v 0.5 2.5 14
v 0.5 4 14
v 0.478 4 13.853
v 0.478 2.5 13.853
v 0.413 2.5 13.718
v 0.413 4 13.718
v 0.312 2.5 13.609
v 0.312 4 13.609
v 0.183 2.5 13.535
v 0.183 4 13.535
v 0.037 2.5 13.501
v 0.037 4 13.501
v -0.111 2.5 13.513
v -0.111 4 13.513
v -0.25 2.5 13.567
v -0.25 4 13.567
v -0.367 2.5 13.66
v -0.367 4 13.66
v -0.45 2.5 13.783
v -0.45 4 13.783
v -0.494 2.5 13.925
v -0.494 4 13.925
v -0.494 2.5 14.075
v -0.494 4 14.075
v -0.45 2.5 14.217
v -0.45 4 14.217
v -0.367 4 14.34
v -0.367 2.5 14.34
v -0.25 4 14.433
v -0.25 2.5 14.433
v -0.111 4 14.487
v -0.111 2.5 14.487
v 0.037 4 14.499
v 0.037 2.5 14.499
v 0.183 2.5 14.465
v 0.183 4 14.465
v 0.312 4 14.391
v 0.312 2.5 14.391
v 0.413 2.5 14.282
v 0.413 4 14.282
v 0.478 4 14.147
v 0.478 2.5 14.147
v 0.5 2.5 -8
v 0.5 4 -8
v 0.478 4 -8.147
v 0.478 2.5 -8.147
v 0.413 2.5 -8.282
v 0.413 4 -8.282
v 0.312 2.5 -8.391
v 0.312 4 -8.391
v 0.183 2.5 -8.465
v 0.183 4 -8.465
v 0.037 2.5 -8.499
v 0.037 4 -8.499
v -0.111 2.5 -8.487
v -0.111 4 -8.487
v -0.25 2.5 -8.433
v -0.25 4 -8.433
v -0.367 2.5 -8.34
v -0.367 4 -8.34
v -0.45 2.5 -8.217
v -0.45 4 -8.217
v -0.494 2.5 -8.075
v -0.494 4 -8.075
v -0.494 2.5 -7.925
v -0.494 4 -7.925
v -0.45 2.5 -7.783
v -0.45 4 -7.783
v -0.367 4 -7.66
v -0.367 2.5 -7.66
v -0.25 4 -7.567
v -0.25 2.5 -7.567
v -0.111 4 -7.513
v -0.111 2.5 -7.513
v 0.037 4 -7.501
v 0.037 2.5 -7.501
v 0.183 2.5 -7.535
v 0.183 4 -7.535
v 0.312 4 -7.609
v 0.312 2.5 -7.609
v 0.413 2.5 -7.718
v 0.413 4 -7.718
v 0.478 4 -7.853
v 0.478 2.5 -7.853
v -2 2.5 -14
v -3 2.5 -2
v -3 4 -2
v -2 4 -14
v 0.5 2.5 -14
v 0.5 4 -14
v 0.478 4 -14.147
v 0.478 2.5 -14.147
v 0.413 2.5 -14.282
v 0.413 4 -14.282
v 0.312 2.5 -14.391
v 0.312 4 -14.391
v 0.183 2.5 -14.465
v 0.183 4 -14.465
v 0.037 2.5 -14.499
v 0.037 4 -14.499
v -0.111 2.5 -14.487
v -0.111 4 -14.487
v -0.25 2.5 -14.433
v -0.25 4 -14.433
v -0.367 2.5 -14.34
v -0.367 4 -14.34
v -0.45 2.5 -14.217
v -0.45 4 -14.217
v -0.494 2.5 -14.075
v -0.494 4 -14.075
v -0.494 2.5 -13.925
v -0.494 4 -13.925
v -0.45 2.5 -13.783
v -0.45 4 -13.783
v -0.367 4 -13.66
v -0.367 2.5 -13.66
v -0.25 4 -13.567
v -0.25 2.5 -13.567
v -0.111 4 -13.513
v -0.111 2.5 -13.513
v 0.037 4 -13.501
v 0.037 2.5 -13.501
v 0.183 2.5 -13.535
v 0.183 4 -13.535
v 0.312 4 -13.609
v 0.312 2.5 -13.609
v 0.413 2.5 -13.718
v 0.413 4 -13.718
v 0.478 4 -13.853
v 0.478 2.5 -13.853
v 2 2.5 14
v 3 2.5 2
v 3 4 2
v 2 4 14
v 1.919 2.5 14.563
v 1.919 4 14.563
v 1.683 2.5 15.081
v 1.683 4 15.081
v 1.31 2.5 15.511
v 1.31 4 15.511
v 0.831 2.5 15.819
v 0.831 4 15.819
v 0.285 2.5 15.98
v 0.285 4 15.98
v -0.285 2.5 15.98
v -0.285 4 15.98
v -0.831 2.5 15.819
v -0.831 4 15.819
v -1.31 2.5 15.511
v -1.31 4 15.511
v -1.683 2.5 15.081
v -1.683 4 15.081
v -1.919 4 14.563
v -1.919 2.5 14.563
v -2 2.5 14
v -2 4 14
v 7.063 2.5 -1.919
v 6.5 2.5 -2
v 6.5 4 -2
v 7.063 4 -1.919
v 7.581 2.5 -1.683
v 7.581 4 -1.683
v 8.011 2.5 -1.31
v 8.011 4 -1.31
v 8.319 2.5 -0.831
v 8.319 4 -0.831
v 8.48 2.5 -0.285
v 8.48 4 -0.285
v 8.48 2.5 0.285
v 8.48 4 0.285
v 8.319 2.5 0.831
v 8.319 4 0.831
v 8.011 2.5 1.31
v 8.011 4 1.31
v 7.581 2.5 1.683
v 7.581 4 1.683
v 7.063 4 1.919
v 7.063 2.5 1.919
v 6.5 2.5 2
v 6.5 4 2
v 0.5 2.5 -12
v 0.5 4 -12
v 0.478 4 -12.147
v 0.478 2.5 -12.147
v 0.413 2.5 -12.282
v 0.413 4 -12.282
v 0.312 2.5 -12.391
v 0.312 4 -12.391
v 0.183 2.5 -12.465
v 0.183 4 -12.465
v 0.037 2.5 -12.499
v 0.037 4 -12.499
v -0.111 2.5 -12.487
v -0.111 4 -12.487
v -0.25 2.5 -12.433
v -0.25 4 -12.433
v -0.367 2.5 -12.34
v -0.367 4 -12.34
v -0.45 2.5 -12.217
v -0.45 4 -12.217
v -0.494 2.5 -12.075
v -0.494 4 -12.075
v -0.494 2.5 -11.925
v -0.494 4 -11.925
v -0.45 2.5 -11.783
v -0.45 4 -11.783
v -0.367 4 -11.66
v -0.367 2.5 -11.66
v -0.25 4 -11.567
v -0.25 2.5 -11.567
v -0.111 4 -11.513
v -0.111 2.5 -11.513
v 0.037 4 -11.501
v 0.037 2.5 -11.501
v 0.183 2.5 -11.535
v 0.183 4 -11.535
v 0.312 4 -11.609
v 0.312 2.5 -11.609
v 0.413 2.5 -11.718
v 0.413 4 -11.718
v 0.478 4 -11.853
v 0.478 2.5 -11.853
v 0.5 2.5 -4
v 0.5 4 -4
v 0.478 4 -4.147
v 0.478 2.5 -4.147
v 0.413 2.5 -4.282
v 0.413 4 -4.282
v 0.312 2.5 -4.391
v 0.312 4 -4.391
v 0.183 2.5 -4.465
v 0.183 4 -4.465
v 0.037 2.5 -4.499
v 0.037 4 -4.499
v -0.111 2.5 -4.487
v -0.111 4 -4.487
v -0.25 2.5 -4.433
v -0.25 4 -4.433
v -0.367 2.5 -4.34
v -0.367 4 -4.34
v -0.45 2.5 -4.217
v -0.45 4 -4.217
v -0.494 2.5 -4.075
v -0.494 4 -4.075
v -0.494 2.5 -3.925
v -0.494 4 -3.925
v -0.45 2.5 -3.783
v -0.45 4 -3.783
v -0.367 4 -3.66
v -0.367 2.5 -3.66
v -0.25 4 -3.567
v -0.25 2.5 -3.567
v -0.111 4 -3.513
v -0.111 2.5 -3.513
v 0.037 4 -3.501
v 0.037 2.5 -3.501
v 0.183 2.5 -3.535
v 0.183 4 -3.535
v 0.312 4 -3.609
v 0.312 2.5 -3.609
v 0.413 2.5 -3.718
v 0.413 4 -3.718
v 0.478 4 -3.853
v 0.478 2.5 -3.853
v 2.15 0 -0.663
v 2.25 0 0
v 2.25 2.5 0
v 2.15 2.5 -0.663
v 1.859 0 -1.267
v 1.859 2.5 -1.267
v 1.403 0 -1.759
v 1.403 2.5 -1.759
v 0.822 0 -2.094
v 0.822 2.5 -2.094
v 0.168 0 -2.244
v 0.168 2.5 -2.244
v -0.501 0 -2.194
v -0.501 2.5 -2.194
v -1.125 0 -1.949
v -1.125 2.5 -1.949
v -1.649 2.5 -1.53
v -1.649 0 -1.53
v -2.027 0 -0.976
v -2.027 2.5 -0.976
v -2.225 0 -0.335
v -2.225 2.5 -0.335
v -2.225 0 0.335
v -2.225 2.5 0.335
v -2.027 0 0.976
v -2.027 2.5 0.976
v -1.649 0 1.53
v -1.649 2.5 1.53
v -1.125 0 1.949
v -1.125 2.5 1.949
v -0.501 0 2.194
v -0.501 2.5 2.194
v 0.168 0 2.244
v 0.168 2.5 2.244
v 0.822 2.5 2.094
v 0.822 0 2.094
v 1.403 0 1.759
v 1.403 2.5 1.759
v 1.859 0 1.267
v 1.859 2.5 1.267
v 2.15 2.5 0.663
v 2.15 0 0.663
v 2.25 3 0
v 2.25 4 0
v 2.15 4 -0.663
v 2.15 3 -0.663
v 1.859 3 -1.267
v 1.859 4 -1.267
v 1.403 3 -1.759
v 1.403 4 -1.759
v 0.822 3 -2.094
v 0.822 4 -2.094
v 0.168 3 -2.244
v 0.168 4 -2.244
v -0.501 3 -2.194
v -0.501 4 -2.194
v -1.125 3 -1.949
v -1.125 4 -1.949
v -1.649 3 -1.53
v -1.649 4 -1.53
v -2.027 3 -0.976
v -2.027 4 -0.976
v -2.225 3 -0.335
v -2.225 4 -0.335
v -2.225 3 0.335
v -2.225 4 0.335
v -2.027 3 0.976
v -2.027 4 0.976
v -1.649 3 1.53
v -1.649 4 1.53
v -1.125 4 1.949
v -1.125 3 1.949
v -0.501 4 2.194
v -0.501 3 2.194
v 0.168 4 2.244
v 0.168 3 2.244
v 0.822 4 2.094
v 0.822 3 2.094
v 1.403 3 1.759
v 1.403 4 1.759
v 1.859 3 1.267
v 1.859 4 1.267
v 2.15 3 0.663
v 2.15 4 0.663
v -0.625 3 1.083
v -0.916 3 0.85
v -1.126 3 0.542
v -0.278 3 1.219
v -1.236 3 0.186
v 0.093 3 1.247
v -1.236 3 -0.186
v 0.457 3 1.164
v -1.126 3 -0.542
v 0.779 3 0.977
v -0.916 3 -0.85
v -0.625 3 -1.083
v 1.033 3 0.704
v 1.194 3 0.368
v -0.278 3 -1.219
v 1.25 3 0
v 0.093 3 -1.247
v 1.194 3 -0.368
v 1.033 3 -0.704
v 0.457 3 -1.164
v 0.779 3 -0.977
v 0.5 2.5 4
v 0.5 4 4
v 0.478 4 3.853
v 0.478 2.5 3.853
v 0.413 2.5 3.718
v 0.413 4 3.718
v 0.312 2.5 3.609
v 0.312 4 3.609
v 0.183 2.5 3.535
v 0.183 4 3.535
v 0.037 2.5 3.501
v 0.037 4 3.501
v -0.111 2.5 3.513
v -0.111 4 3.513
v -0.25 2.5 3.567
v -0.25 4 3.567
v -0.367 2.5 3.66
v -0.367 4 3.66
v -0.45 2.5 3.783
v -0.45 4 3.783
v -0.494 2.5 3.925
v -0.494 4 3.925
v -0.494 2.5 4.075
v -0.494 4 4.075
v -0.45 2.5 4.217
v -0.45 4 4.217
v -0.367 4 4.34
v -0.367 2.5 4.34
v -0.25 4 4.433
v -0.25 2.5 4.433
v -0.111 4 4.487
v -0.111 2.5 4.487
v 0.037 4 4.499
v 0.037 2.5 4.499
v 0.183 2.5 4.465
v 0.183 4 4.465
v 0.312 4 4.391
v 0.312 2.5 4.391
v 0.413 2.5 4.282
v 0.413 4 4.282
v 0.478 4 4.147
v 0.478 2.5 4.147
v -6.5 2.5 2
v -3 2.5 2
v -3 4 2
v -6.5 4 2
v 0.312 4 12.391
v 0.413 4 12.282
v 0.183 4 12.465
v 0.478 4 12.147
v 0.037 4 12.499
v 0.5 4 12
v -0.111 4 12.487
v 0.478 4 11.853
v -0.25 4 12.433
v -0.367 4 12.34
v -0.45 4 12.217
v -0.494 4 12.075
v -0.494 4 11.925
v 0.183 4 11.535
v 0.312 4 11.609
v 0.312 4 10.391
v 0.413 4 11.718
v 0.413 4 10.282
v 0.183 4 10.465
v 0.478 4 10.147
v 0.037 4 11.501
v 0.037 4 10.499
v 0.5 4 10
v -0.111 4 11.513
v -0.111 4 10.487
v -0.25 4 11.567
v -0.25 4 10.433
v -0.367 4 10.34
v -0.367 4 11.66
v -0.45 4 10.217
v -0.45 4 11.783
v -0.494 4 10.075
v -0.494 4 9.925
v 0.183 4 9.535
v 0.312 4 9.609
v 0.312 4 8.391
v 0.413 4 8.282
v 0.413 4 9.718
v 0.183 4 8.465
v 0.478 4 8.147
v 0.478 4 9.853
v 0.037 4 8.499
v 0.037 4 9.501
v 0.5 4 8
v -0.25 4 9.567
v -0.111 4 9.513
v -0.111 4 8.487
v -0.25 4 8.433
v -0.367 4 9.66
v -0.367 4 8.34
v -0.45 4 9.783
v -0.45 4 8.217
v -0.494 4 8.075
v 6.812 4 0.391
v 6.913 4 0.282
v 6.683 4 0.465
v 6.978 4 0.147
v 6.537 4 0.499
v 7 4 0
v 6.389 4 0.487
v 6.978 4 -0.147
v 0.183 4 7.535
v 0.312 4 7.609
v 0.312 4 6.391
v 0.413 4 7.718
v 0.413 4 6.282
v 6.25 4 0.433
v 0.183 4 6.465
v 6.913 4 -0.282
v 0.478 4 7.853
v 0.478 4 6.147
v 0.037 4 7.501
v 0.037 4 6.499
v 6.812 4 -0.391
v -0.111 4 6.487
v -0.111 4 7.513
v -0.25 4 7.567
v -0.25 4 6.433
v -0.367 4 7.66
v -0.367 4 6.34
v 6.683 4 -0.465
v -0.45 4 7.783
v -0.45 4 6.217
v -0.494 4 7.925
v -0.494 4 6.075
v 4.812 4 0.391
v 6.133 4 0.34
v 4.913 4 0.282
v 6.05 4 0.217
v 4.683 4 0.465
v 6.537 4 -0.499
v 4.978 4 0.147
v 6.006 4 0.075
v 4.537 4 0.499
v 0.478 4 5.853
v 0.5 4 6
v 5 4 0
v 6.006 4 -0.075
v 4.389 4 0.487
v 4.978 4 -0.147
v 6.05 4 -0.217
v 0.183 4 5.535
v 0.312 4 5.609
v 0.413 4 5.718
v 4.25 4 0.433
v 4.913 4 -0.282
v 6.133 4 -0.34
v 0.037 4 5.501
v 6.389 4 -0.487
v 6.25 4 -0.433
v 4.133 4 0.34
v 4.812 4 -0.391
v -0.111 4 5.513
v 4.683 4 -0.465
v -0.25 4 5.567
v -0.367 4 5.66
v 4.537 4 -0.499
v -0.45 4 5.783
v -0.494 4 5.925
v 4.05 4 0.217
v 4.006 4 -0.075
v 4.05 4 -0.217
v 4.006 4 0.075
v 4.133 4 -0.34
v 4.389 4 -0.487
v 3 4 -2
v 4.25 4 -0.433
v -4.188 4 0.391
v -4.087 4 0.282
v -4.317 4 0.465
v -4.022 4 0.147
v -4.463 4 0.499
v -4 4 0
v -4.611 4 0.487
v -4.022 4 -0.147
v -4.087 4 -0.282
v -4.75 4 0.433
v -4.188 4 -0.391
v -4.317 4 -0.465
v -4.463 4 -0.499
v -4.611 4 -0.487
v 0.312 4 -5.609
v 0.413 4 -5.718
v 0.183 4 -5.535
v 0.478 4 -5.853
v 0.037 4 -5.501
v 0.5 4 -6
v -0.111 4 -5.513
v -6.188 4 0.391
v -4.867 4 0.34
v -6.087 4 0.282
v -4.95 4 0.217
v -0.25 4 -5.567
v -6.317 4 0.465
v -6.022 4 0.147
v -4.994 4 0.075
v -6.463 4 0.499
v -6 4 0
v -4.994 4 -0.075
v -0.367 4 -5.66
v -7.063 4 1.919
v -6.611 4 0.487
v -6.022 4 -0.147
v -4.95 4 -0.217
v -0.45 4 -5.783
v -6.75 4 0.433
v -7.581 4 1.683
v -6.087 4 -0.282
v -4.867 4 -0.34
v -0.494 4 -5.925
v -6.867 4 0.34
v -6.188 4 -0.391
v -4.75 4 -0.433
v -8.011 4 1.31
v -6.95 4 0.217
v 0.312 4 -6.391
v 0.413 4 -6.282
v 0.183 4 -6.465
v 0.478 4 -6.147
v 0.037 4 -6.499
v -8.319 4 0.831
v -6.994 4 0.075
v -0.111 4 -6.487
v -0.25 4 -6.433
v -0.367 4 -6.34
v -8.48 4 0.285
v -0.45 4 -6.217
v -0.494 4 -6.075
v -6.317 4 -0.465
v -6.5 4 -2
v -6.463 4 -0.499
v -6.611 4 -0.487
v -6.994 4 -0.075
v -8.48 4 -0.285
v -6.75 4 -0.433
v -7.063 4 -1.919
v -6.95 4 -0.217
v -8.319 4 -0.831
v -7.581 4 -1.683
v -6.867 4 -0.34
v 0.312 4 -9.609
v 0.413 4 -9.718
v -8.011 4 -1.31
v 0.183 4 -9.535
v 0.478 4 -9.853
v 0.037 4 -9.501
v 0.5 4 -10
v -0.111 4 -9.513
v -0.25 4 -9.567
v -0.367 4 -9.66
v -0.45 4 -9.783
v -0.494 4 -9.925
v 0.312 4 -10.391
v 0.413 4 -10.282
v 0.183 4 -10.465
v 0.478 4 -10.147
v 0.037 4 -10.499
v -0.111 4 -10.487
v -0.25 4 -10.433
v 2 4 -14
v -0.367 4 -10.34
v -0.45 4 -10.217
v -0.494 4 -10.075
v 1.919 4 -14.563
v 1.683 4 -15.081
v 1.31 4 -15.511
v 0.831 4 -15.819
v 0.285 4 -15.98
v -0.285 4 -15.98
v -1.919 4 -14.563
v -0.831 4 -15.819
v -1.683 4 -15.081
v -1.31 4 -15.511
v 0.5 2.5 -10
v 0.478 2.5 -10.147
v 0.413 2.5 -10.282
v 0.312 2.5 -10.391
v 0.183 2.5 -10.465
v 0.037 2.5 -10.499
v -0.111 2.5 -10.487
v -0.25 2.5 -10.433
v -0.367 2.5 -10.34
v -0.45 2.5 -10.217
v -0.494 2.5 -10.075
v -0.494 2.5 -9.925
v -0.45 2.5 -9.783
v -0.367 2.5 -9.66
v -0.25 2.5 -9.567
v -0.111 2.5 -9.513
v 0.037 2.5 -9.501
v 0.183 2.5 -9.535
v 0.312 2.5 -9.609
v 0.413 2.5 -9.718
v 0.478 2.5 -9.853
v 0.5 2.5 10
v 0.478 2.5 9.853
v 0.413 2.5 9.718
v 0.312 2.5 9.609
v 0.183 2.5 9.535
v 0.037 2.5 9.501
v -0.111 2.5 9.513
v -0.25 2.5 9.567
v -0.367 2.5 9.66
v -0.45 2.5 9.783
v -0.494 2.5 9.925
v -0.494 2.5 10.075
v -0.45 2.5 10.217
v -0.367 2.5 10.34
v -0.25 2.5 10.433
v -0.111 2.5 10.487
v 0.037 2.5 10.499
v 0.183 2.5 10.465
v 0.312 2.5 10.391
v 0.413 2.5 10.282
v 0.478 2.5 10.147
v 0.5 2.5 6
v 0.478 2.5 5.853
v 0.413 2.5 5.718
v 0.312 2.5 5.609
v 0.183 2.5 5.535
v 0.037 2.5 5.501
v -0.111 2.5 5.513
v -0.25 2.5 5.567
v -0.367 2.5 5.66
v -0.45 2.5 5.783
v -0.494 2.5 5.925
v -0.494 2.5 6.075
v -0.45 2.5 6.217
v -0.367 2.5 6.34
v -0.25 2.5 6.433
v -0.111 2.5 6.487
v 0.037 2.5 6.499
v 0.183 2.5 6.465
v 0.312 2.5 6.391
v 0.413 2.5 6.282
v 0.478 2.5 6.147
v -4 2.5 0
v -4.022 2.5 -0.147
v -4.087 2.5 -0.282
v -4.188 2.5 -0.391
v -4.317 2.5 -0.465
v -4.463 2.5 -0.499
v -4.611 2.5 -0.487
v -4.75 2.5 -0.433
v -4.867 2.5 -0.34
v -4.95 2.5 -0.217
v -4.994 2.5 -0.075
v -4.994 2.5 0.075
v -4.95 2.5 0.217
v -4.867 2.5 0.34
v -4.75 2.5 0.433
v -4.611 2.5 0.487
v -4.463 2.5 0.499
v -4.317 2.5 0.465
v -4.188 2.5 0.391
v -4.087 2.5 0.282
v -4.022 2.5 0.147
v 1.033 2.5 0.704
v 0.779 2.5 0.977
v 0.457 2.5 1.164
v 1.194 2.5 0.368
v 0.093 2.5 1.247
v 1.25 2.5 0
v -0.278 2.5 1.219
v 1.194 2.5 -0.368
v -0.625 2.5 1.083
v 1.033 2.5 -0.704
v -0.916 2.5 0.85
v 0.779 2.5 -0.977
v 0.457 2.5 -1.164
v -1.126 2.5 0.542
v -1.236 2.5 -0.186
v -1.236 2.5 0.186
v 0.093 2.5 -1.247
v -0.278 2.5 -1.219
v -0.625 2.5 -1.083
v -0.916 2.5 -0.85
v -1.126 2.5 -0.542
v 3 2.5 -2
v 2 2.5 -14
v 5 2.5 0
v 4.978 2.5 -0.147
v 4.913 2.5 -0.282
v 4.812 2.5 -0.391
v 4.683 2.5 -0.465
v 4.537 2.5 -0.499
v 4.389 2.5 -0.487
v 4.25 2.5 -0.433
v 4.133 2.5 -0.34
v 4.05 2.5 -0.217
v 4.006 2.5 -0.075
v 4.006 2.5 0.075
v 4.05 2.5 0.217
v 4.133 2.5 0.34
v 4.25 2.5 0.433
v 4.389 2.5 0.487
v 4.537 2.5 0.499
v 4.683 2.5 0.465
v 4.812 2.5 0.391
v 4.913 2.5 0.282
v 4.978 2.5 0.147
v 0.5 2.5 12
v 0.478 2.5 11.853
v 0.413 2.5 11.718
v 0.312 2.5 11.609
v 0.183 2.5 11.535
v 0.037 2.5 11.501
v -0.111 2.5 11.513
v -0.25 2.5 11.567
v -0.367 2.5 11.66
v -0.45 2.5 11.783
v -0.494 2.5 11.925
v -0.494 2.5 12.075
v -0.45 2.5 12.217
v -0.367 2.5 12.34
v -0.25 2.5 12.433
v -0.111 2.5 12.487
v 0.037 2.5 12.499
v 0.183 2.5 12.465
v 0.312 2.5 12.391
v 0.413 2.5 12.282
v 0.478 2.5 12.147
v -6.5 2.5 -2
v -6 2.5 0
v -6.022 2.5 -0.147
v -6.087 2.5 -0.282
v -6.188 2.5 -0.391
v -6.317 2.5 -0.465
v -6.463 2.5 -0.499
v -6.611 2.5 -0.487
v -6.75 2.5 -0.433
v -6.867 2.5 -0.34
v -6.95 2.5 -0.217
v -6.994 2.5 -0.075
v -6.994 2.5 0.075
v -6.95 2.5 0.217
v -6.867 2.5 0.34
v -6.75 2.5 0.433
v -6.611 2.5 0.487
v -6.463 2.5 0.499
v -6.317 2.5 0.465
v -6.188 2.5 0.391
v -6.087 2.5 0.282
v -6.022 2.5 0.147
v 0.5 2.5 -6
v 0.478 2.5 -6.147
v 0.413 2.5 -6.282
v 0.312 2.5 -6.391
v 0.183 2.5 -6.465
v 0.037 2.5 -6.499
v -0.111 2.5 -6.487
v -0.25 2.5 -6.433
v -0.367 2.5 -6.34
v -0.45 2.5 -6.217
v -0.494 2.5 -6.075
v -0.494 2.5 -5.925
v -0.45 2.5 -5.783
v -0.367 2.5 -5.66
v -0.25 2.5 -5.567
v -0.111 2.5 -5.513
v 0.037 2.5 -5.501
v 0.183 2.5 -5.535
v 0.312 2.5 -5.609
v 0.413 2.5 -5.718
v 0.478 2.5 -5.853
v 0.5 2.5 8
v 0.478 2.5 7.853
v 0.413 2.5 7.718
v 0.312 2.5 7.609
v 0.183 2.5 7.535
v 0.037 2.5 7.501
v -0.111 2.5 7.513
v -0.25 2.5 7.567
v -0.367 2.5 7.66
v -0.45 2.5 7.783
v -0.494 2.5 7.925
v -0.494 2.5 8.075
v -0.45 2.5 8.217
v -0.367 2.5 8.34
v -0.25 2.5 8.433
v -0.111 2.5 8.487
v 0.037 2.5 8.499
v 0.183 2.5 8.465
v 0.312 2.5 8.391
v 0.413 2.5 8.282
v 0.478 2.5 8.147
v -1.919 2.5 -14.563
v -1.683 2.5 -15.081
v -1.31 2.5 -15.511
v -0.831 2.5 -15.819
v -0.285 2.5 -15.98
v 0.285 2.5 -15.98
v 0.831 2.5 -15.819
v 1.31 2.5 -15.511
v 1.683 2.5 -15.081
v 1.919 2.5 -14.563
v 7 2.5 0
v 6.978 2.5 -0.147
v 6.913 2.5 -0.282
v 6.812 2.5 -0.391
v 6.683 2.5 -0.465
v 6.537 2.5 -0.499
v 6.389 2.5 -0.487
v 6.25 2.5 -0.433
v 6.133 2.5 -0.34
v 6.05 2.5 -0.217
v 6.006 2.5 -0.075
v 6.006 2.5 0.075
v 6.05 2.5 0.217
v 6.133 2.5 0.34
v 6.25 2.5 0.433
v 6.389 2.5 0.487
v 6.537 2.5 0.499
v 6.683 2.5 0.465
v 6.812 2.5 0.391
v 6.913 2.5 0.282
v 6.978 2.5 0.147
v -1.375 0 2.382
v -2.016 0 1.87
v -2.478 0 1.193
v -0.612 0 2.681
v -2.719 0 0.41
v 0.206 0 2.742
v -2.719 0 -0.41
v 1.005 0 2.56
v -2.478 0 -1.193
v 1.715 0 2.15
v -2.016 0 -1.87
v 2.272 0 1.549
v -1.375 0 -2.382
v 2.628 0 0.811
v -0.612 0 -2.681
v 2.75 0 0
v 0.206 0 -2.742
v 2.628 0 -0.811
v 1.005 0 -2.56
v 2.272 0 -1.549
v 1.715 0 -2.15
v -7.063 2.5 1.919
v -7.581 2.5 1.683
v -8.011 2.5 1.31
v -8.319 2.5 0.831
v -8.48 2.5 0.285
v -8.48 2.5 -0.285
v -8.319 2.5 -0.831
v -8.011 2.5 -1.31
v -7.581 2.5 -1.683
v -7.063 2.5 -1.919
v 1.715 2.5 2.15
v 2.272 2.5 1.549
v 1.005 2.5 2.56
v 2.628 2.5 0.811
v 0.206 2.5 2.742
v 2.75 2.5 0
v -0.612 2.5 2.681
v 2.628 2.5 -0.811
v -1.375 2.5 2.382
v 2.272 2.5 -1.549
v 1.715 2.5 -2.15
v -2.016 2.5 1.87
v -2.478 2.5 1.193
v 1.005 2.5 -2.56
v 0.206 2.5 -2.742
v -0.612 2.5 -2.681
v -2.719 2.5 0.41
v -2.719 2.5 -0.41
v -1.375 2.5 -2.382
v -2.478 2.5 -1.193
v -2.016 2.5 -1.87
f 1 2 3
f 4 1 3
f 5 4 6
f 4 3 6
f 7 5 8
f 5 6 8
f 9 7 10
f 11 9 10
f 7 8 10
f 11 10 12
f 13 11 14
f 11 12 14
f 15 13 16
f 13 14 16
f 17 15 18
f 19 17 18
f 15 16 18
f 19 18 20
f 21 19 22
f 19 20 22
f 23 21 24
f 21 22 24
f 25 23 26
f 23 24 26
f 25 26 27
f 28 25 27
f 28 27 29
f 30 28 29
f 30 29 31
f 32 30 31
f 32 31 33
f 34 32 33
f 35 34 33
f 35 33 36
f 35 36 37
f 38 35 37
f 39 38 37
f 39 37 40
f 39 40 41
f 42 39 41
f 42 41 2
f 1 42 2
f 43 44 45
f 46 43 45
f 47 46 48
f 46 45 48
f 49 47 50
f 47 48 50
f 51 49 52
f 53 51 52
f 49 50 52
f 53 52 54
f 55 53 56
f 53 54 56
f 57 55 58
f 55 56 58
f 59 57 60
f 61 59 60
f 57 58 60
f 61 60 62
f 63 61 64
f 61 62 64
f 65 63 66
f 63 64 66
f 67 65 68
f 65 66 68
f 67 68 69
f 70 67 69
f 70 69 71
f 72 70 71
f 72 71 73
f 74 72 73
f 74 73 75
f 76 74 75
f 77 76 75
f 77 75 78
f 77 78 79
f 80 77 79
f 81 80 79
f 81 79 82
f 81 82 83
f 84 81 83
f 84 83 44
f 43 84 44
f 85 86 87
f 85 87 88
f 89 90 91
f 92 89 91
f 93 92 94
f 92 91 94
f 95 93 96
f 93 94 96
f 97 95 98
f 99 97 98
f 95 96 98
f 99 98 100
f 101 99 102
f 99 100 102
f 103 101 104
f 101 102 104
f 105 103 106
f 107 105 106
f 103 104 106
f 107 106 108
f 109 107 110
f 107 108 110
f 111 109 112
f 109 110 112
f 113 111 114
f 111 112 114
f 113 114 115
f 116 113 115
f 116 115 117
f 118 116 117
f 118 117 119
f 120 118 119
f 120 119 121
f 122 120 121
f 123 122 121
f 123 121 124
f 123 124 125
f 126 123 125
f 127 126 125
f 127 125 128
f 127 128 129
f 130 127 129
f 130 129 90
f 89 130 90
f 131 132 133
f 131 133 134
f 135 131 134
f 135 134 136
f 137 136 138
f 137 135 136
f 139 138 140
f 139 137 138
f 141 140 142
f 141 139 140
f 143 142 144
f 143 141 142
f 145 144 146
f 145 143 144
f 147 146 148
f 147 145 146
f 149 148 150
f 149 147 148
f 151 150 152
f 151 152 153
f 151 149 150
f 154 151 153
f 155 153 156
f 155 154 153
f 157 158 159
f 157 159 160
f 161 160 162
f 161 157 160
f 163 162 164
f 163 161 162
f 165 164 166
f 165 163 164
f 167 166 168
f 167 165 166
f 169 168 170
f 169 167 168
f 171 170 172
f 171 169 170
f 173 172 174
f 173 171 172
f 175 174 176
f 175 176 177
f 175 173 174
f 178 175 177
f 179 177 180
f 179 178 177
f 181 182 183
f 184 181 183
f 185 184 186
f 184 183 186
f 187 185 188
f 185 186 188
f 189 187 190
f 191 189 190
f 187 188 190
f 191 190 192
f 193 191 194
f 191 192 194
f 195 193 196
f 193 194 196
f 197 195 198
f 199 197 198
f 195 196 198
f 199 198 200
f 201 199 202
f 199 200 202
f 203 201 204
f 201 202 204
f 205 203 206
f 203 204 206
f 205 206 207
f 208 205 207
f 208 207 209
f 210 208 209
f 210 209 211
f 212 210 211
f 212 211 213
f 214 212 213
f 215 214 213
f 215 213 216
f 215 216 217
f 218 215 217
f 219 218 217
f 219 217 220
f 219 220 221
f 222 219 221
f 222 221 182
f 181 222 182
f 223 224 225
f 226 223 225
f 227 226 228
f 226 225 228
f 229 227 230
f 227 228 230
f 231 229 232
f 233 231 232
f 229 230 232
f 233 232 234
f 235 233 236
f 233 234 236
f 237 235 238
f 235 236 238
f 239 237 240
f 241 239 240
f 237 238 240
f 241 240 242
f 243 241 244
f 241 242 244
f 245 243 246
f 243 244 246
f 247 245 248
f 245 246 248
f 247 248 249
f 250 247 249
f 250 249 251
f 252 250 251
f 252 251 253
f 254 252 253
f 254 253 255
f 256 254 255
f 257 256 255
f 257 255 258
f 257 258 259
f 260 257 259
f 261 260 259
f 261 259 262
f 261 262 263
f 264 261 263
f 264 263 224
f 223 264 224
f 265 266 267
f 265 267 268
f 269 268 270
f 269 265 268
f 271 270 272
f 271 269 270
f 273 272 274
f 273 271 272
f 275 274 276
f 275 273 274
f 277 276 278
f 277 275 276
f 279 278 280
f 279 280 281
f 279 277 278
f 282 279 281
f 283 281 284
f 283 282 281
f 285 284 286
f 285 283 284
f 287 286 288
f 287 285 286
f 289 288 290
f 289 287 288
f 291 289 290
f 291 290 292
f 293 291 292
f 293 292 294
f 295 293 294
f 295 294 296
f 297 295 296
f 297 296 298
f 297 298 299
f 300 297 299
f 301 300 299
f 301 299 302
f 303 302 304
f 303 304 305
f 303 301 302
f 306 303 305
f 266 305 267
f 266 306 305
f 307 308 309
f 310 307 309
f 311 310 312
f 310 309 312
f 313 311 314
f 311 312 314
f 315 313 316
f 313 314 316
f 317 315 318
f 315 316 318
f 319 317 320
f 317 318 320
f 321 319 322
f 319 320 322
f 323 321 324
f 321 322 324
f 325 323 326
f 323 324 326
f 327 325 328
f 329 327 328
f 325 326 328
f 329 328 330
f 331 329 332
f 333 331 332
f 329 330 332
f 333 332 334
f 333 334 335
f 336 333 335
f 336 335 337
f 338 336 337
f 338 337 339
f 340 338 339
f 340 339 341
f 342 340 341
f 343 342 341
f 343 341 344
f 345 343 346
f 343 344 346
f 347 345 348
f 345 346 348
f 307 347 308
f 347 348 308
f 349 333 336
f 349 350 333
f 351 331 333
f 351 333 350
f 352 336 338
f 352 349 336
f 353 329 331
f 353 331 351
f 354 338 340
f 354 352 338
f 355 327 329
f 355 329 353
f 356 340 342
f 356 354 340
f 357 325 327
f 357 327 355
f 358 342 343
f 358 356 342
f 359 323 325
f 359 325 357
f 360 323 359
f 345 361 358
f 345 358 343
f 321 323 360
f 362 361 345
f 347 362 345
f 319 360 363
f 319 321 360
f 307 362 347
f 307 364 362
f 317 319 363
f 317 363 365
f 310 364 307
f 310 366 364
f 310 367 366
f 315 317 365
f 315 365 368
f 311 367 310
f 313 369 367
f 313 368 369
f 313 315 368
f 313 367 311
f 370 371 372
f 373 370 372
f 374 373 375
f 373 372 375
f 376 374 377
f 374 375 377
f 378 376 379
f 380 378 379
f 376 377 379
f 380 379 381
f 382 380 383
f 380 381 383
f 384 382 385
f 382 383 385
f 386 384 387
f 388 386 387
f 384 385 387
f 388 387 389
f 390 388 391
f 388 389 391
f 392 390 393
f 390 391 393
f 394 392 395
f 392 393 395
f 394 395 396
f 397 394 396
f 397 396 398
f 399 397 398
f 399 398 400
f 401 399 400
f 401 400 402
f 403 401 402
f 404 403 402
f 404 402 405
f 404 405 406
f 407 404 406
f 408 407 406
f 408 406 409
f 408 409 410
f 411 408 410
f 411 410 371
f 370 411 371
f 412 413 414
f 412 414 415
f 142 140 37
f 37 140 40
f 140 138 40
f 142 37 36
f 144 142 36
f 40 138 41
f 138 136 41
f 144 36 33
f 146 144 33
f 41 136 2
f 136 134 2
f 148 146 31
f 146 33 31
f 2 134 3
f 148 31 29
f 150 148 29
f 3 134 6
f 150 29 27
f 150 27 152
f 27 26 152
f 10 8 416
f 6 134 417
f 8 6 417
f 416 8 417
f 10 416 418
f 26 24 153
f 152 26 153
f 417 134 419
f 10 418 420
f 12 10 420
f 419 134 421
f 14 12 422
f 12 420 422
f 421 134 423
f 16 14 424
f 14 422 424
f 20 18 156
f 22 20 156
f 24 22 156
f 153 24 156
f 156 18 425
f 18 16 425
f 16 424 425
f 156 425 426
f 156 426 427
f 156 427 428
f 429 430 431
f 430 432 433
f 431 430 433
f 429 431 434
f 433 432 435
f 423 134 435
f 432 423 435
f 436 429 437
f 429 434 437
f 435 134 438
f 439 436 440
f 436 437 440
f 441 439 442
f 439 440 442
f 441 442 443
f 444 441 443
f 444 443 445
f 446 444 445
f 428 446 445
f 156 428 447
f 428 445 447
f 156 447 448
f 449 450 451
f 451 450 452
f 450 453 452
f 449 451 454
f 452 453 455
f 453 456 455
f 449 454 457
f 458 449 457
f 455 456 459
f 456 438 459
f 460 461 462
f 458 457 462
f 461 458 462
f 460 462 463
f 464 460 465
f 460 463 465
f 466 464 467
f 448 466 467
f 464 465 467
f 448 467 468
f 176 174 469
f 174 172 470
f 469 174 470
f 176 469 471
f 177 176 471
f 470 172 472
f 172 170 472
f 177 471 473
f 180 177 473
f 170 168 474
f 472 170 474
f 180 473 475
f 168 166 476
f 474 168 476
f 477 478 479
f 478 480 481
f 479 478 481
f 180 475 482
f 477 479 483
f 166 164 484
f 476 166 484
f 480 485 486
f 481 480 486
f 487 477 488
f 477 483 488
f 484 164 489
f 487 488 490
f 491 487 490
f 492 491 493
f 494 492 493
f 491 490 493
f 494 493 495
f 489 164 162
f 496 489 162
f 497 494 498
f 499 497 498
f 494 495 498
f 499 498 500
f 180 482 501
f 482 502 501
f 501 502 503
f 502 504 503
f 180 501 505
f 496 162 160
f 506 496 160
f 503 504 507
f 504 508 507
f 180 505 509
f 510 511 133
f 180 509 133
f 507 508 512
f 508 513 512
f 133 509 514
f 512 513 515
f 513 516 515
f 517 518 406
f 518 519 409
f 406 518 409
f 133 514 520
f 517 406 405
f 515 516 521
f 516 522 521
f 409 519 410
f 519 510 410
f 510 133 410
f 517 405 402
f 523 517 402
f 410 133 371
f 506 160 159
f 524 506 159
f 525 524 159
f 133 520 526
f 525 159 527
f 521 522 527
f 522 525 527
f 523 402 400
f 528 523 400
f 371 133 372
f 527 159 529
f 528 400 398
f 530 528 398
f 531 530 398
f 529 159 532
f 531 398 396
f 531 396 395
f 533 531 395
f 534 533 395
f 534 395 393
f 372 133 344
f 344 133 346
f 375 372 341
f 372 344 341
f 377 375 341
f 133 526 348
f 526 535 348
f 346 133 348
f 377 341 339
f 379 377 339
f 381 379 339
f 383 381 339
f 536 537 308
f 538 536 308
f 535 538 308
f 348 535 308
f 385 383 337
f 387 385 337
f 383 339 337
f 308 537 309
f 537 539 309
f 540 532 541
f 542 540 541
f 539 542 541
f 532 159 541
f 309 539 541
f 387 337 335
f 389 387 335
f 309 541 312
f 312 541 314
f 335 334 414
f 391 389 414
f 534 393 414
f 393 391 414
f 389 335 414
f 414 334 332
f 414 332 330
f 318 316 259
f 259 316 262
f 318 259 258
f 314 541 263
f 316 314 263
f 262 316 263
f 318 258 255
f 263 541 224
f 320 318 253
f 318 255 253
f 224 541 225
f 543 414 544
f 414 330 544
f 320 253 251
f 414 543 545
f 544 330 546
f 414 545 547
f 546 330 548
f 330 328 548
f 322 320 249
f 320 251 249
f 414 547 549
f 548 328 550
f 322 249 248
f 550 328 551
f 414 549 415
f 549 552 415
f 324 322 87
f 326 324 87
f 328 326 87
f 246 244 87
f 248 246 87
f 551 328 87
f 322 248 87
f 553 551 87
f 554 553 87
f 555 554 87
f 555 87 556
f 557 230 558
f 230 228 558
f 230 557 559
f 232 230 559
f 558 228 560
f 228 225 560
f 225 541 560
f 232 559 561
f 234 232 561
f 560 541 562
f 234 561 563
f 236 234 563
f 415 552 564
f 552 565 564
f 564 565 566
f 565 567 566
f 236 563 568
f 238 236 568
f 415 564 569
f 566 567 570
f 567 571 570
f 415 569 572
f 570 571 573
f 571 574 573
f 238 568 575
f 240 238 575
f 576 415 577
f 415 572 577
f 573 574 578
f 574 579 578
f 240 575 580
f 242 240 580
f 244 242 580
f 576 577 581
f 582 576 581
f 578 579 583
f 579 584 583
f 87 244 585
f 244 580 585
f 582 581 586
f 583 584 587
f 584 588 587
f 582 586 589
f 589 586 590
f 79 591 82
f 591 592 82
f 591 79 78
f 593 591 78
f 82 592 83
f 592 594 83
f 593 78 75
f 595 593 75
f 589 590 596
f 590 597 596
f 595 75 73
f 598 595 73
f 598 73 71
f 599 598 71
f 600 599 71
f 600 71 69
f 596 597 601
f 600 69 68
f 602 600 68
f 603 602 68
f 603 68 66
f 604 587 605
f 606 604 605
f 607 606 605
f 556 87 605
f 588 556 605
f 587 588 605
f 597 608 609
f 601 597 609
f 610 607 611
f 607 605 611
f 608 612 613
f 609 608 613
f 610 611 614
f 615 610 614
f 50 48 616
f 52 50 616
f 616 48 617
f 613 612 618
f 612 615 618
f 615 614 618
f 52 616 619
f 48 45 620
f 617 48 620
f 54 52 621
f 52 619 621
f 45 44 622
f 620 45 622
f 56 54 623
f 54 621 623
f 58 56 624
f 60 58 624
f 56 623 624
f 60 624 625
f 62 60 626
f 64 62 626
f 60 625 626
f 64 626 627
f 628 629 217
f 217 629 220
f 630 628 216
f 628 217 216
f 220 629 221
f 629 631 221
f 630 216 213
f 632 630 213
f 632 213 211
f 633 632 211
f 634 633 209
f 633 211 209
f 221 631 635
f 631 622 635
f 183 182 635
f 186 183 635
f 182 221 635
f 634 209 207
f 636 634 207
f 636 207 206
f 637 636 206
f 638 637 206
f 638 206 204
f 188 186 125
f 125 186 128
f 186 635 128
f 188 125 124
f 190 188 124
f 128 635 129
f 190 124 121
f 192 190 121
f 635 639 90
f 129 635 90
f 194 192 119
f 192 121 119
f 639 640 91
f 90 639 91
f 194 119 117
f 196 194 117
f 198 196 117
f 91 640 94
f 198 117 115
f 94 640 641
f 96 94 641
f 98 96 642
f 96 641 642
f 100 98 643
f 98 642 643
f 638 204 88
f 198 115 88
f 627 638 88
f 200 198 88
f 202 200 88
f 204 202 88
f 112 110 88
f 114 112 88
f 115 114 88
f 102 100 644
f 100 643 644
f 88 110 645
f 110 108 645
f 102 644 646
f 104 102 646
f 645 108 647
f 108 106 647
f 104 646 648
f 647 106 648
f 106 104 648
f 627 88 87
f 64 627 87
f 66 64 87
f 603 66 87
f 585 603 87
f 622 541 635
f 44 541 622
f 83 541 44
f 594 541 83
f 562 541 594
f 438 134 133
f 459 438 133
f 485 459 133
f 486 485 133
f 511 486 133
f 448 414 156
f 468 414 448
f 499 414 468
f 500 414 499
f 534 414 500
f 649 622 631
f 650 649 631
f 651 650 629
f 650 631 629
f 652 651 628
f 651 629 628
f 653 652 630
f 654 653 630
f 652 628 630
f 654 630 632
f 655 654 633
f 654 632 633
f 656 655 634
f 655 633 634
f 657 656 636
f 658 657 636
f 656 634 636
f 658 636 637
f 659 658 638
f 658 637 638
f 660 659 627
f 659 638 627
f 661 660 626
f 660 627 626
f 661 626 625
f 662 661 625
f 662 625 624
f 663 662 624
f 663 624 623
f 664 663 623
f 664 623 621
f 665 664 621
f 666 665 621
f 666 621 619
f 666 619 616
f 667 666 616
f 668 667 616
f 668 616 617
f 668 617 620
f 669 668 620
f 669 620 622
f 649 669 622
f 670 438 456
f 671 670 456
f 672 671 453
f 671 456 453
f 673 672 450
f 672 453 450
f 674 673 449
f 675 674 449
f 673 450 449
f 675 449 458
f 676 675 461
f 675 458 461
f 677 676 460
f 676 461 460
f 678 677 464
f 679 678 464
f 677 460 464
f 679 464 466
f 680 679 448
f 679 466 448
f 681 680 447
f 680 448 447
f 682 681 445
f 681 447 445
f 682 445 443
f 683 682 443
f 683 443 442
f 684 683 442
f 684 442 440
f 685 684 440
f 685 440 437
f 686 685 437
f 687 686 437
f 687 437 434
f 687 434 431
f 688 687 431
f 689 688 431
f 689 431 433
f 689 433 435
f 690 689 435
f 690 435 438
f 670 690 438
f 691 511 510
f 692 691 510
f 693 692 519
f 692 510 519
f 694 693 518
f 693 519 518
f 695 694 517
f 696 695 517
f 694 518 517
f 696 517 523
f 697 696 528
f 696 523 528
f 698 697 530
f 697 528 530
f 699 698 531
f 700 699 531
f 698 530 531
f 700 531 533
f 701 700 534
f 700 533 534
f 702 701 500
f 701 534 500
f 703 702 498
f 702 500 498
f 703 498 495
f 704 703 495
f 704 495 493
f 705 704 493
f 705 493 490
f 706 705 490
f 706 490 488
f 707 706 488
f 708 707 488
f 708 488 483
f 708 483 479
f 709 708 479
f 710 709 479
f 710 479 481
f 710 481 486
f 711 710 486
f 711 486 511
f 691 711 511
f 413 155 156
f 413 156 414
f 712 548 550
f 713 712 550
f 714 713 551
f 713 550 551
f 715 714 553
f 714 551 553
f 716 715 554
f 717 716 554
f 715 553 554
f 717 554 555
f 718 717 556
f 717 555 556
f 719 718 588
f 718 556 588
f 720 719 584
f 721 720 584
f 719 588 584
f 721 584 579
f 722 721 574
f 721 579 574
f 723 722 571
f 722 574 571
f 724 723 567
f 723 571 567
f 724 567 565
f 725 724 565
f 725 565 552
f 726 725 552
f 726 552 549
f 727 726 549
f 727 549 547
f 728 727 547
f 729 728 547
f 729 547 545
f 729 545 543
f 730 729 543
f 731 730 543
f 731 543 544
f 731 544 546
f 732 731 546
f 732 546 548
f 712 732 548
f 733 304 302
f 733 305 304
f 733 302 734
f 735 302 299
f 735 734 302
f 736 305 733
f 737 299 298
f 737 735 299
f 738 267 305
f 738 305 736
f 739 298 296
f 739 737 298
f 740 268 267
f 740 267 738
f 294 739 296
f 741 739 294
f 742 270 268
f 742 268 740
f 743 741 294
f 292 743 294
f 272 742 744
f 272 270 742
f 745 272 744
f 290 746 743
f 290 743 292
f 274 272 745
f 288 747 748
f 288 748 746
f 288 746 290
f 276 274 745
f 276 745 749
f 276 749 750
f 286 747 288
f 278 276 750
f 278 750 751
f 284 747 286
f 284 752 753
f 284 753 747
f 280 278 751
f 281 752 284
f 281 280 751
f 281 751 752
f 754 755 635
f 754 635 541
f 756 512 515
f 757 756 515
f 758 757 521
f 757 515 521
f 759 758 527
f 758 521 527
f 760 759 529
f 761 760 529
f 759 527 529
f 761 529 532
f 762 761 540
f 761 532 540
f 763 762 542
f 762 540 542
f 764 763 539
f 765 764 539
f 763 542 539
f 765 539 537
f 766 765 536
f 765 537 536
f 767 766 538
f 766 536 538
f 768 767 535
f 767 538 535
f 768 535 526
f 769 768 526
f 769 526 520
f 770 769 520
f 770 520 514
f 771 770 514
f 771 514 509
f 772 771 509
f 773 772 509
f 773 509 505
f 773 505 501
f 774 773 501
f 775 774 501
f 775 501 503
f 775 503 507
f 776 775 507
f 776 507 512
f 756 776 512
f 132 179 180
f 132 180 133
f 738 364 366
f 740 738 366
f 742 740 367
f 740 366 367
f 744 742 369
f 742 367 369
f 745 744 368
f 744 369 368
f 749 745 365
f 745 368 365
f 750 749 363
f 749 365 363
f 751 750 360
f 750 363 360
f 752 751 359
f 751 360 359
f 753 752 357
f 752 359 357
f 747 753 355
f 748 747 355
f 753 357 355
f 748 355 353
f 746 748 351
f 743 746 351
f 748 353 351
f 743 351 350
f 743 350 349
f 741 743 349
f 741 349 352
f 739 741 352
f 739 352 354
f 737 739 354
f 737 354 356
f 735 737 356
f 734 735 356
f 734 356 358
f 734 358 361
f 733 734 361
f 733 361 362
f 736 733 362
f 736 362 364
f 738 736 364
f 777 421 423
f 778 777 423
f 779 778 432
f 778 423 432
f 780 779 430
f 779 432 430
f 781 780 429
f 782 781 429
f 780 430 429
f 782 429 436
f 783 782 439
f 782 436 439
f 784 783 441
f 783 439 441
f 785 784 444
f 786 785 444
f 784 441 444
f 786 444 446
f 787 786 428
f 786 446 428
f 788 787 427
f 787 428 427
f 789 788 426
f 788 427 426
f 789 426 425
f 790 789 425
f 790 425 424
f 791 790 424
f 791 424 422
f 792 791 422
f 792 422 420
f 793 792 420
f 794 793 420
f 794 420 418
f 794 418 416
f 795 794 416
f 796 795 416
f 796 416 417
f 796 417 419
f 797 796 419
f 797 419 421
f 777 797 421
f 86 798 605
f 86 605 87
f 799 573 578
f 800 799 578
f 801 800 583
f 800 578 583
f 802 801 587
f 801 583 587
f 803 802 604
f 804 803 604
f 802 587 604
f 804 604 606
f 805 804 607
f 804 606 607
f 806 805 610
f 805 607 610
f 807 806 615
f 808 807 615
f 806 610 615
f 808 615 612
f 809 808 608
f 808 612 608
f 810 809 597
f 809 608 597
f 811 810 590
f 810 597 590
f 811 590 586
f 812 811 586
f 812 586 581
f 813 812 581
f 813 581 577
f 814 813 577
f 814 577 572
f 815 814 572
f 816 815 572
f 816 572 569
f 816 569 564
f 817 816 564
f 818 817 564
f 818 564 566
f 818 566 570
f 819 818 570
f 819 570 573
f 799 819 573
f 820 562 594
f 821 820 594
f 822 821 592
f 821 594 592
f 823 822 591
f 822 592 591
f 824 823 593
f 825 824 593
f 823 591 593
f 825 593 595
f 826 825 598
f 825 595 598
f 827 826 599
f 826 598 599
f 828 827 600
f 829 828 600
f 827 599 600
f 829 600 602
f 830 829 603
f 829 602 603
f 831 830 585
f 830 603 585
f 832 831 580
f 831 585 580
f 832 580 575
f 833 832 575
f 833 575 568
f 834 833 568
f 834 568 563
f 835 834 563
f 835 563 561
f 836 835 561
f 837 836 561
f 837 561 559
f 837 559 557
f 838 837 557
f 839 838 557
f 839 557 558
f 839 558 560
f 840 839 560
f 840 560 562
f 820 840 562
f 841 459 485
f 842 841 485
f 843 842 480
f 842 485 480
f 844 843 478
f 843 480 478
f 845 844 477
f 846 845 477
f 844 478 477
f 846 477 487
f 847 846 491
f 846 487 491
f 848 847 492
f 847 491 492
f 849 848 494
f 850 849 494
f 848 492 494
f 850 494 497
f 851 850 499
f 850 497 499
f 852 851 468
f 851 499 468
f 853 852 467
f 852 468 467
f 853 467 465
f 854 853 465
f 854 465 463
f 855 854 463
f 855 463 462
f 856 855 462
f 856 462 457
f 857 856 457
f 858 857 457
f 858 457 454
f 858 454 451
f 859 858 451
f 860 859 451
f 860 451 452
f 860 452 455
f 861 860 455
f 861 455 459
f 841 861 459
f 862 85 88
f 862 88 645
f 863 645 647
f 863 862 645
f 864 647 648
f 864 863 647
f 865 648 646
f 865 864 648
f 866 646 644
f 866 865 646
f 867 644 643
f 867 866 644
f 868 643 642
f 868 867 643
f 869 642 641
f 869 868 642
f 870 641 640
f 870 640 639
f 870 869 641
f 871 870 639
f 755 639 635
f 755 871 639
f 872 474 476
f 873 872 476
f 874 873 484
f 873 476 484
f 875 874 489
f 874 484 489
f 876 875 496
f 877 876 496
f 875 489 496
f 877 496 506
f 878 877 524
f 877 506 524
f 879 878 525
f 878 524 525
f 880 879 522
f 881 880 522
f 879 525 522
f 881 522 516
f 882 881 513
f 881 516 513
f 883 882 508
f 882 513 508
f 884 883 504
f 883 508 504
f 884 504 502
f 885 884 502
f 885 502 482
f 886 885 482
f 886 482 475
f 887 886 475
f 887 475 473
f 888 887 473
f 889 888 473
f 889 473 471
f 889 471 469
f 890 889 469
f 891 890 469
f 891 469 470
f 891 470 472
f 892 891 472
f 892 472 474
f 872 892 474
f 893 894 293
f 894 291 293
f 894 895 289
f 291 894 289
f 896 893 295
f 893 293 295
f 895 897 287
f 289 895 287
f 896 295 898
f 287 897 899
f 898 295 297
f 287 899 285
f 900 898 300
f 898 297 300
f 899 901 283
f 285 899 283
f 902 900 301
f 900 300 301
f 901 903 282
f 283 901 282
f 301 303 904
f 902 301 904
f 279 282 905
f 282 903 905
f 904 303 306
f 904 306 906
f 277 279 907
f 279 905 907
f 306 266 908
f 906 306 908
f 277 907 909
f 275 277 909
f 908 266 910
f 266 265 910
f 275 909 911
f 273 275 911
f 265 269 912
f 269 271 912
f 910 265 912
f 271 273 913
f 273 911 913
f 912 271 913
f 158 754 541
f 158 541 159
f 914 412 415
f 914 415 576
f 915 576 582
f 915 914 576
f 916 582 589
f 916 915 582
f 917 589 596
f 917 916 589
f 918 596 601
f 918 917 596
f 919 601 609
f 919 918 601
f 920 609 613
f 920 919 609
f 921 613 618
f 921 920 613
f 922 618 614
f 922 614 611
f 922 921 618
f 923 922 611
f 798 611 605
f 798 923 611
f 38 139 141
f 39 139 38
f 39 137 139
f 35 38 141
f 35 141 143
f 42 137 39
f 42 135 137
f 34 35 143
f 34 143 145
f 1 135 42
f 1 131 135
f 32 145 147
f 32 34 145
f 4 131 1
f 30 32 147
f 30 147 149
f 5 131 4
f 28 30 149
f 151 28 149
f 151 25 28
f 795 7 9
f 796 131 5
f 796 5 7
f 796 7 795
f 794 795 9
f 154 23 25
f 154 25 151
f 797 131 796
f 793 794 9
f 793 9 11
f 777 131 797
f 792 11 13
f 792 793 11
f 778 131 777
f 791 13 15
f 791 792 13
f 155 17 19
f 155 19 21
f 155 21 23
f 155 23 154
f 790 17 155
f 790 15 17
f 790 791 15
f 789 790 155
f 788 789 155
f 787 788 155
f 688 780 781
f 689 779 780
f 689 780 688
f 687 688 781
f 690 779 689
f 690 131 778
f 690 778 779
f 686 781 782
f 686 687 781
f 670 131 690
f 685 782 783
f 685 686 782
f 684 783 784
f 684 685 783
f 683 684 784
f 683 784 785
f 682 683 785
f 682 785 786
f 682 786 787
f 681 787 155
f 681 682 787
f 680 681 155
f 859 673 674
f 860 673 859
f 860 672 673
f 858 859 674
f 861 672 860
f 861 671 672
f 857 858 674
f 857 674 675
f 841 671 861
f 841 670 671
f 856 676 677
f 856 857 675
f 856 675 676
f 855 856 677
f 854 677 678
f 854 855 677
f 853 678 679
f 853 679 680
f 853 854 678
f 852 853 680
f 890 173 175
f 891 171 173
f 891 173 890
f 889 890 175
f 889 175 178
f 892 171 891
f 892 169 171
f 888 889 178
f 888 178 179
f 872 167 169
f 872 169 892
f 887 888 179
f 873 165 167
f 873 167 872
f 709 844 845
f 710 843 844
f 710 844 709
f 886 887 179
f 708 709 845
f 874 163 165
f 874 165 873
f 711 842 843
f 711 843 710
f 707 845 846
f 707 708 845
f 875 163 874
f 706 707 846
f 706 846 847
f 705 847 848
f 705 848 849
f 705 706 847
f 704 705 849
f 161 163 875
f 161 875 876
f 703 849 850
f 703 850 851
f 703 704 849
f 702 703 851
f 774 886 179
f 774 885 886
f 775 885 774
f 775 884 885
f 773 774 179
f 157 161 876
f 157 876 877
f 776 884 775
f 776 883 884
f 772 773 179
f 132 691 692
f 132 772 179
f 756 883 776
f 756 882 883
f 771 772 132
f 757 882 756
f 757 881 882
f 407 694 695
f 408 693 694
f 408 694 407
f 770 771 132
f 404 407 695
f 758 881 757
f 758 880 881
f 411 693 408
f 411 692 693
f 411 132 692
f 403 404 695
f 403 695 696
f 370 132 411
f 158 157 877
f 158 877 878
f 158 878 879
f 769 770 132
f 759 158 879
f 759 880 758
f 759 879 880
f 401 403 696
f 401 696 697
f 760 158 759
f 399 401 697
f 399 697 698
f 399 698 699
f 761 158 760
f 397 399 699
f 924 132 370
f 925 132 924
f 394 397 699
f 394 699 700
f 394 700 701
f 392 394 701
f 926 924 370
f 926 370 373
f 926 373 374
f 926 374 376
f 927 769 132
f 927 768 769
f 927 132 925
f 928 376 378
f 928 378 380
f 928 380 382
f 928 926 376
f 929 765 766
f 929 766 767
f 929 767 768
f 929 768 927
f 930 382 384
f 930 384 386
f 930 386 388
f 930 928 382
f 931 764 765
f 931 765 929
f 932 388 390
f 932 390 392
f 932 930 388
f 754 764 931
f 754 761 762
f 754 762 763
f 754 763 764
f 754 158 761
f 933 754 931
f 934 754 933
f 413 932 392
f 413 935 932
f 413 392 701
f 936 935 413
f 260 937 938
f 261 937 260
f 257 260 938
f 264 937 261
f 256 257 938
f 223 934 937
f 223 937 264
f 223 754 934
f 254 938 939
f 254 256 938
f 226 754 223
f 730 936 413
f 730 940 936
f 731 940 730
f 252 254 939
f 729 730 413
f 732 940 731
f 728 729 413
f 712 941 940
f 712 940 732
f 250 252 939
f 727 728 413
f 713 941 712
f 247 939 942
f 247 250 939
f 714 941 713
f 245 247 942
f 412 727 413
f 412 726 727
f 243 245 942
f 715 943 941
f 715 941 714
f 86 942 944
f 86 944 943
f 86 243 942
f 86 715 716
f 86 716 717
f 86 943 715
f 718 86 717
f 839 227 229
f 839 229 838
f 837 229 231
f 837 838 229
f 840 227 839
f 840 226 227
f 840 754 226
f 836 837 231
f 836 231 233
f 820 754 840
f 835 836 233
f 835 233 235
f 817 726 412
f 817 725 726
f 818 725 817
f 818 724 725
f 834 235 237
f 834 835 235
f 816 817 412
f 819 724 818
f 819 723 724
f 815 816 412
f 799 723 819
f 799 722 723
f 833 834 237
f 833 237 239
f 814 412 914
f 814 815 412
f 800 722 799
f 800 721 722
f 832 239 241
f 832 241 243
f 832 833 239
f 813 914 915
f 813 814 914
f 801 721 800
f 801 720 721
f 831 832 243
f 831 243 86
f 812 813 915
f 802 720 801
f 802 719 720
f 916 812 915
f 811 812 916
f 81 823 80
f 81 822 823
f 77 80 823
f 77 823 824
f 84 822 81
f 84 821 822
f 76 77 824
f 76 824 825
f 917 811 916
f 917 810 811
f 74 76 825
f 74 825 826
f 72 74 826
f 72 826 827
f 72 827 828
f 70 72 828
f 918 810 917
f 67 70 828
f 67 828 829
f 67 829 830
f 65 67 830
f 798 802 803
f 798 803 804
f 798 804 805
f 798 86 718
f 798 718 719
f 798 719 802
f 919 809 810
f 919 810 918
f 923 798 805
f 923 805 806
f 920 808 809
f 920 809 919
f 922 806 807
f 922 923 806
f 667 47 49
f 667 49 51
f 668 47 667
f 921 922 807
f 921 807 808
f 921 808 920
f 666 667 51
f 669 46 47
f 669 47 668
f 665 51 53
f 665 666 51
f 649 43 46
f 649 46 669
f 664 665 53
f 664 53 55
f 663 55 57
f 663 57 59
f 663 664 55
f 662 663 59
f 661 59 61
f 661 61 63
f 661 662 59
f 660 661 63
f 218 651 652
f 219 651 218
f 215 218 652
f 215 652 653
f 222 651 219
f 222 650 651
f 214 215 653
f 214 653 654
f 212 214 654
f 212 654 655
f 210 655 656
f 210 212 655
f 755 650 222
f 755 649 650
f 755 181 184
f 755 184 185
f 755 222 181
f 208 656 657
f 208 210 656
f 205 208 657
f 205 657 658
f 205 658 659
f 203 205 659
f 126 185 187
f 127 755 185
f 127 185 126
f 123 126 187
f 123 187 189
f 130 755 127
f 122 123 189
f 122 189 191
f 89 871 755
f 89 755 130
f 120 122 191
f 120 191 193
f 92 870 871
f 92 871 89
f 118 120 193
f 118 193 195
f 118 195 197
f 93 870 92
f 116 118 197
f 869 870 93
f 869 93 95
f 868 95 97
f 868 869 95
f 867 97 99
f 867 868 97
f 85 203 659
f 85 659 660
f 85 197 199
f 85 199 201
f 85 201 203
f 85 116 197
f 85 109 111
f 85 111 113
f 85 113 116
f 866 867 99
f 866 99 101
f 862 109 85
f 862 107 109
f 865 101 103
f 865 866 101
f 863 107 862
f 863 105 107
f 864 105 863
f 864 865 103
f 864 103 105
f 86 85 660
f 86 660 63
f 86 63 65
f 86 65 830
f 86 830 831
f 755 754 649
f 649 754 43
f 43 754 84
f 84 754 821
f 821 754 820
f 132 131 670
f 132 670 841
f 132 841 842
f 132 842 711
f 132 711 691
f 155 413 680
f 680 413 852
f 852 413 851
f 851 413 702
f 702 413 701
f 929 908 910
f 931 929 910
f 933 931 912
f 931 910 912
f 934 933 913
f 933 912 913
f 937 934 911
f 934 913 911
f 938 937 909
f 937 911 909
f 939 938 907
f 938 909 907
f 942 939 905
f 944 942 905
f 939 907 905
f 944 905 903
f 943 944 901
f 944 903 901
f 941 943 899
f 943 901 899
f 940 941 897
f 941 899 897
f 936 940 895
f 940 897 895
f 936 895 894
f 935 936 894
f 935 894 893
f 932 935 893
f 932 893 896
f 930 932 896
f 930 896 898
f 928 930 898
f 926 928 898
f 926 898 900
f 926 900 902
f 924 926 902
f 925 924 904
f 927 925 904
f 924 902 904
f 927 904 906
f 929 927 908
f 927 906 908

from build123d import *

# Parameters (mm, degrees)
ESQUISSE1_R             = 2.75
ESQUISSE1_R_2           = 2.25
BOSS_EXTRU_1_DEPTH      = 2.5
BOSS_EXTRU_2_DEPTH      = 1.5
ESQUISSE4_R             = 2.25
ENL_V_MAT_EXTRU_1_DEPTH = 1
ENL_V_MAT_EXTRU_2_REACH = 5
ESQUISSE5_R             = 1.25
ESQUISSE6_R             = 0.5
ENL_V_MAT_EXTRU_3_DEPTH = 5


with BuildPart() as part:
    # Esquisse1 → Boss.-Extru.1 (new body)
    with BuildSketch(Plane(origin=(0, 0, 0), x_dir=(1, 0, 0), z_dir=(0, 1, 0))):
        Circle(ESQUISSE1_R)
        Circle(ESQUISSE1_R_2, mode=Mode.SUBTRACT)
    extrude(amount=BOSS_EXTRU_1_DEPTH)

    # Esquisse3 → Boss.-Extru.2 (add)
    with BuildSketch(Plane(origin=(0, 2.5, 0), x_dir=(1, 0, 0), z_dir=(0, 1, 0))):
        with BuildLine():
            Line((-6.5, 2), (-3, 2))
            Line((-3, 2), (-2, 14))
            ThreePointArc((-2, 14), (0, 16), (2, 14))
            Line((2, 14), (3, 2))
            Line((3, 2), (6.5, 2))
            ThreePointArc((6.5, 2), (8.5, 0), (6.5, -2))
            Line((6.5, -2), (3, -2))
            Line((3, -2), (2, -14))
            ThreePointArc((2, -14), (0, -16), (-2, -14))
            Line((-2, -14), (-3, -2))
            Line((-3, -2), (-6.5, -2))
            ThreePointArc((-6.5, -2), (-8.5, 0), (-6.5, 2))
        make_face()
    extrude(amount=BOSS_EXTRU_2_DEPTH)

    # Esquisse4 → Enlèv. mat.-Extru.1 (cut)
    with BuildSketch(Plane(origin=(0, 4, 0), x_dir=(1, 0, 0), z_dir=(0, 1, 0))):
        Circle(ESQUISSE4_R)
    extrude(amount=-ENL_V_MAT_EXTRU_1_DEPTH, mode=Mode.SUBTRACT)

    # Esquisse5 → Enlèv. mat.-Extru.2 (cut, up to next)
    with BuildSketch(Plane(origin=(0, 3, 0), x_dir=(1, 0, 0), z_dir=(0, 1, 0)), mode=Mode.PRIVATE) as enl_v_mat_extru_2_sk1:
        Circle(ESQUISSE5_R)
    enl_v_mat_extru_2_tool1 = extrude(enl_v_mat_extru_2_sk1.sketch, amount=-ENL_V_MAT_EXTRU_2_REACH, mode=Mode.PRIVATE) & part.part
    add(enl_v_mat_extru_2_tool1.solids().sort_by_distance((0, 3, 0))[0], mode=Mode.SUBTRACT)

    # Esquisse6 → Enlèv. mat.-Extru.3 (cut, through all)
    with BuildSketch(Plane(origin=(0, 4, 0), x_dir=(1, 0, 0), z_dir=(0, 1, 0))):
        with Locations((4.5, 0)):
            Circle(ESQUISSE6_R)
        with Locations((6.5, 0)):
            Circle(ESQUISSE6_R)
        with Locations((-4.5, 0)):
            Circle(ESQUISSE6_R)
        with Locations((-6.5, 0)):
            Circle(ESQUISSE6_R)
        with Locations((0, 14)):
            Circle(ESQUISSE6_R)
        with Locations((0, 12)):
            Circle(ESQUISSE6_R)
        with Locations((0, 10)):
            Circle(ESQUISSE6_R)
        with Locations((0, 8)):
            Circle(ESQUISSE6_R)
        with Locations((0, 6)):
            Circle(ESQUISSE6_R)
        with Locations((0, 4)):
            Circle(ESQUISSE6_R)
        with Locations((0, -4)):
            Circle(ESQUISSE6_R)
        with Locations((0, -6)):
            Circle(ESQUISSE6_R)
        with Locations((0, -8)):
            Circle(ESQUISSE6_R)
        with Locations((0, -10)):
            Circle(ESQUISSE6_R)
        with Locations((0, -12)):
            Circle(ESQUISSE6_R)
        with Locations((0, -14)):
            Circle(ESQUISSE6_R)
    extrude(amount=-ENL_V_MAT_EXTRU_3_DEPTH, mode=Mode.SUBTRACT)


solid = part.part
